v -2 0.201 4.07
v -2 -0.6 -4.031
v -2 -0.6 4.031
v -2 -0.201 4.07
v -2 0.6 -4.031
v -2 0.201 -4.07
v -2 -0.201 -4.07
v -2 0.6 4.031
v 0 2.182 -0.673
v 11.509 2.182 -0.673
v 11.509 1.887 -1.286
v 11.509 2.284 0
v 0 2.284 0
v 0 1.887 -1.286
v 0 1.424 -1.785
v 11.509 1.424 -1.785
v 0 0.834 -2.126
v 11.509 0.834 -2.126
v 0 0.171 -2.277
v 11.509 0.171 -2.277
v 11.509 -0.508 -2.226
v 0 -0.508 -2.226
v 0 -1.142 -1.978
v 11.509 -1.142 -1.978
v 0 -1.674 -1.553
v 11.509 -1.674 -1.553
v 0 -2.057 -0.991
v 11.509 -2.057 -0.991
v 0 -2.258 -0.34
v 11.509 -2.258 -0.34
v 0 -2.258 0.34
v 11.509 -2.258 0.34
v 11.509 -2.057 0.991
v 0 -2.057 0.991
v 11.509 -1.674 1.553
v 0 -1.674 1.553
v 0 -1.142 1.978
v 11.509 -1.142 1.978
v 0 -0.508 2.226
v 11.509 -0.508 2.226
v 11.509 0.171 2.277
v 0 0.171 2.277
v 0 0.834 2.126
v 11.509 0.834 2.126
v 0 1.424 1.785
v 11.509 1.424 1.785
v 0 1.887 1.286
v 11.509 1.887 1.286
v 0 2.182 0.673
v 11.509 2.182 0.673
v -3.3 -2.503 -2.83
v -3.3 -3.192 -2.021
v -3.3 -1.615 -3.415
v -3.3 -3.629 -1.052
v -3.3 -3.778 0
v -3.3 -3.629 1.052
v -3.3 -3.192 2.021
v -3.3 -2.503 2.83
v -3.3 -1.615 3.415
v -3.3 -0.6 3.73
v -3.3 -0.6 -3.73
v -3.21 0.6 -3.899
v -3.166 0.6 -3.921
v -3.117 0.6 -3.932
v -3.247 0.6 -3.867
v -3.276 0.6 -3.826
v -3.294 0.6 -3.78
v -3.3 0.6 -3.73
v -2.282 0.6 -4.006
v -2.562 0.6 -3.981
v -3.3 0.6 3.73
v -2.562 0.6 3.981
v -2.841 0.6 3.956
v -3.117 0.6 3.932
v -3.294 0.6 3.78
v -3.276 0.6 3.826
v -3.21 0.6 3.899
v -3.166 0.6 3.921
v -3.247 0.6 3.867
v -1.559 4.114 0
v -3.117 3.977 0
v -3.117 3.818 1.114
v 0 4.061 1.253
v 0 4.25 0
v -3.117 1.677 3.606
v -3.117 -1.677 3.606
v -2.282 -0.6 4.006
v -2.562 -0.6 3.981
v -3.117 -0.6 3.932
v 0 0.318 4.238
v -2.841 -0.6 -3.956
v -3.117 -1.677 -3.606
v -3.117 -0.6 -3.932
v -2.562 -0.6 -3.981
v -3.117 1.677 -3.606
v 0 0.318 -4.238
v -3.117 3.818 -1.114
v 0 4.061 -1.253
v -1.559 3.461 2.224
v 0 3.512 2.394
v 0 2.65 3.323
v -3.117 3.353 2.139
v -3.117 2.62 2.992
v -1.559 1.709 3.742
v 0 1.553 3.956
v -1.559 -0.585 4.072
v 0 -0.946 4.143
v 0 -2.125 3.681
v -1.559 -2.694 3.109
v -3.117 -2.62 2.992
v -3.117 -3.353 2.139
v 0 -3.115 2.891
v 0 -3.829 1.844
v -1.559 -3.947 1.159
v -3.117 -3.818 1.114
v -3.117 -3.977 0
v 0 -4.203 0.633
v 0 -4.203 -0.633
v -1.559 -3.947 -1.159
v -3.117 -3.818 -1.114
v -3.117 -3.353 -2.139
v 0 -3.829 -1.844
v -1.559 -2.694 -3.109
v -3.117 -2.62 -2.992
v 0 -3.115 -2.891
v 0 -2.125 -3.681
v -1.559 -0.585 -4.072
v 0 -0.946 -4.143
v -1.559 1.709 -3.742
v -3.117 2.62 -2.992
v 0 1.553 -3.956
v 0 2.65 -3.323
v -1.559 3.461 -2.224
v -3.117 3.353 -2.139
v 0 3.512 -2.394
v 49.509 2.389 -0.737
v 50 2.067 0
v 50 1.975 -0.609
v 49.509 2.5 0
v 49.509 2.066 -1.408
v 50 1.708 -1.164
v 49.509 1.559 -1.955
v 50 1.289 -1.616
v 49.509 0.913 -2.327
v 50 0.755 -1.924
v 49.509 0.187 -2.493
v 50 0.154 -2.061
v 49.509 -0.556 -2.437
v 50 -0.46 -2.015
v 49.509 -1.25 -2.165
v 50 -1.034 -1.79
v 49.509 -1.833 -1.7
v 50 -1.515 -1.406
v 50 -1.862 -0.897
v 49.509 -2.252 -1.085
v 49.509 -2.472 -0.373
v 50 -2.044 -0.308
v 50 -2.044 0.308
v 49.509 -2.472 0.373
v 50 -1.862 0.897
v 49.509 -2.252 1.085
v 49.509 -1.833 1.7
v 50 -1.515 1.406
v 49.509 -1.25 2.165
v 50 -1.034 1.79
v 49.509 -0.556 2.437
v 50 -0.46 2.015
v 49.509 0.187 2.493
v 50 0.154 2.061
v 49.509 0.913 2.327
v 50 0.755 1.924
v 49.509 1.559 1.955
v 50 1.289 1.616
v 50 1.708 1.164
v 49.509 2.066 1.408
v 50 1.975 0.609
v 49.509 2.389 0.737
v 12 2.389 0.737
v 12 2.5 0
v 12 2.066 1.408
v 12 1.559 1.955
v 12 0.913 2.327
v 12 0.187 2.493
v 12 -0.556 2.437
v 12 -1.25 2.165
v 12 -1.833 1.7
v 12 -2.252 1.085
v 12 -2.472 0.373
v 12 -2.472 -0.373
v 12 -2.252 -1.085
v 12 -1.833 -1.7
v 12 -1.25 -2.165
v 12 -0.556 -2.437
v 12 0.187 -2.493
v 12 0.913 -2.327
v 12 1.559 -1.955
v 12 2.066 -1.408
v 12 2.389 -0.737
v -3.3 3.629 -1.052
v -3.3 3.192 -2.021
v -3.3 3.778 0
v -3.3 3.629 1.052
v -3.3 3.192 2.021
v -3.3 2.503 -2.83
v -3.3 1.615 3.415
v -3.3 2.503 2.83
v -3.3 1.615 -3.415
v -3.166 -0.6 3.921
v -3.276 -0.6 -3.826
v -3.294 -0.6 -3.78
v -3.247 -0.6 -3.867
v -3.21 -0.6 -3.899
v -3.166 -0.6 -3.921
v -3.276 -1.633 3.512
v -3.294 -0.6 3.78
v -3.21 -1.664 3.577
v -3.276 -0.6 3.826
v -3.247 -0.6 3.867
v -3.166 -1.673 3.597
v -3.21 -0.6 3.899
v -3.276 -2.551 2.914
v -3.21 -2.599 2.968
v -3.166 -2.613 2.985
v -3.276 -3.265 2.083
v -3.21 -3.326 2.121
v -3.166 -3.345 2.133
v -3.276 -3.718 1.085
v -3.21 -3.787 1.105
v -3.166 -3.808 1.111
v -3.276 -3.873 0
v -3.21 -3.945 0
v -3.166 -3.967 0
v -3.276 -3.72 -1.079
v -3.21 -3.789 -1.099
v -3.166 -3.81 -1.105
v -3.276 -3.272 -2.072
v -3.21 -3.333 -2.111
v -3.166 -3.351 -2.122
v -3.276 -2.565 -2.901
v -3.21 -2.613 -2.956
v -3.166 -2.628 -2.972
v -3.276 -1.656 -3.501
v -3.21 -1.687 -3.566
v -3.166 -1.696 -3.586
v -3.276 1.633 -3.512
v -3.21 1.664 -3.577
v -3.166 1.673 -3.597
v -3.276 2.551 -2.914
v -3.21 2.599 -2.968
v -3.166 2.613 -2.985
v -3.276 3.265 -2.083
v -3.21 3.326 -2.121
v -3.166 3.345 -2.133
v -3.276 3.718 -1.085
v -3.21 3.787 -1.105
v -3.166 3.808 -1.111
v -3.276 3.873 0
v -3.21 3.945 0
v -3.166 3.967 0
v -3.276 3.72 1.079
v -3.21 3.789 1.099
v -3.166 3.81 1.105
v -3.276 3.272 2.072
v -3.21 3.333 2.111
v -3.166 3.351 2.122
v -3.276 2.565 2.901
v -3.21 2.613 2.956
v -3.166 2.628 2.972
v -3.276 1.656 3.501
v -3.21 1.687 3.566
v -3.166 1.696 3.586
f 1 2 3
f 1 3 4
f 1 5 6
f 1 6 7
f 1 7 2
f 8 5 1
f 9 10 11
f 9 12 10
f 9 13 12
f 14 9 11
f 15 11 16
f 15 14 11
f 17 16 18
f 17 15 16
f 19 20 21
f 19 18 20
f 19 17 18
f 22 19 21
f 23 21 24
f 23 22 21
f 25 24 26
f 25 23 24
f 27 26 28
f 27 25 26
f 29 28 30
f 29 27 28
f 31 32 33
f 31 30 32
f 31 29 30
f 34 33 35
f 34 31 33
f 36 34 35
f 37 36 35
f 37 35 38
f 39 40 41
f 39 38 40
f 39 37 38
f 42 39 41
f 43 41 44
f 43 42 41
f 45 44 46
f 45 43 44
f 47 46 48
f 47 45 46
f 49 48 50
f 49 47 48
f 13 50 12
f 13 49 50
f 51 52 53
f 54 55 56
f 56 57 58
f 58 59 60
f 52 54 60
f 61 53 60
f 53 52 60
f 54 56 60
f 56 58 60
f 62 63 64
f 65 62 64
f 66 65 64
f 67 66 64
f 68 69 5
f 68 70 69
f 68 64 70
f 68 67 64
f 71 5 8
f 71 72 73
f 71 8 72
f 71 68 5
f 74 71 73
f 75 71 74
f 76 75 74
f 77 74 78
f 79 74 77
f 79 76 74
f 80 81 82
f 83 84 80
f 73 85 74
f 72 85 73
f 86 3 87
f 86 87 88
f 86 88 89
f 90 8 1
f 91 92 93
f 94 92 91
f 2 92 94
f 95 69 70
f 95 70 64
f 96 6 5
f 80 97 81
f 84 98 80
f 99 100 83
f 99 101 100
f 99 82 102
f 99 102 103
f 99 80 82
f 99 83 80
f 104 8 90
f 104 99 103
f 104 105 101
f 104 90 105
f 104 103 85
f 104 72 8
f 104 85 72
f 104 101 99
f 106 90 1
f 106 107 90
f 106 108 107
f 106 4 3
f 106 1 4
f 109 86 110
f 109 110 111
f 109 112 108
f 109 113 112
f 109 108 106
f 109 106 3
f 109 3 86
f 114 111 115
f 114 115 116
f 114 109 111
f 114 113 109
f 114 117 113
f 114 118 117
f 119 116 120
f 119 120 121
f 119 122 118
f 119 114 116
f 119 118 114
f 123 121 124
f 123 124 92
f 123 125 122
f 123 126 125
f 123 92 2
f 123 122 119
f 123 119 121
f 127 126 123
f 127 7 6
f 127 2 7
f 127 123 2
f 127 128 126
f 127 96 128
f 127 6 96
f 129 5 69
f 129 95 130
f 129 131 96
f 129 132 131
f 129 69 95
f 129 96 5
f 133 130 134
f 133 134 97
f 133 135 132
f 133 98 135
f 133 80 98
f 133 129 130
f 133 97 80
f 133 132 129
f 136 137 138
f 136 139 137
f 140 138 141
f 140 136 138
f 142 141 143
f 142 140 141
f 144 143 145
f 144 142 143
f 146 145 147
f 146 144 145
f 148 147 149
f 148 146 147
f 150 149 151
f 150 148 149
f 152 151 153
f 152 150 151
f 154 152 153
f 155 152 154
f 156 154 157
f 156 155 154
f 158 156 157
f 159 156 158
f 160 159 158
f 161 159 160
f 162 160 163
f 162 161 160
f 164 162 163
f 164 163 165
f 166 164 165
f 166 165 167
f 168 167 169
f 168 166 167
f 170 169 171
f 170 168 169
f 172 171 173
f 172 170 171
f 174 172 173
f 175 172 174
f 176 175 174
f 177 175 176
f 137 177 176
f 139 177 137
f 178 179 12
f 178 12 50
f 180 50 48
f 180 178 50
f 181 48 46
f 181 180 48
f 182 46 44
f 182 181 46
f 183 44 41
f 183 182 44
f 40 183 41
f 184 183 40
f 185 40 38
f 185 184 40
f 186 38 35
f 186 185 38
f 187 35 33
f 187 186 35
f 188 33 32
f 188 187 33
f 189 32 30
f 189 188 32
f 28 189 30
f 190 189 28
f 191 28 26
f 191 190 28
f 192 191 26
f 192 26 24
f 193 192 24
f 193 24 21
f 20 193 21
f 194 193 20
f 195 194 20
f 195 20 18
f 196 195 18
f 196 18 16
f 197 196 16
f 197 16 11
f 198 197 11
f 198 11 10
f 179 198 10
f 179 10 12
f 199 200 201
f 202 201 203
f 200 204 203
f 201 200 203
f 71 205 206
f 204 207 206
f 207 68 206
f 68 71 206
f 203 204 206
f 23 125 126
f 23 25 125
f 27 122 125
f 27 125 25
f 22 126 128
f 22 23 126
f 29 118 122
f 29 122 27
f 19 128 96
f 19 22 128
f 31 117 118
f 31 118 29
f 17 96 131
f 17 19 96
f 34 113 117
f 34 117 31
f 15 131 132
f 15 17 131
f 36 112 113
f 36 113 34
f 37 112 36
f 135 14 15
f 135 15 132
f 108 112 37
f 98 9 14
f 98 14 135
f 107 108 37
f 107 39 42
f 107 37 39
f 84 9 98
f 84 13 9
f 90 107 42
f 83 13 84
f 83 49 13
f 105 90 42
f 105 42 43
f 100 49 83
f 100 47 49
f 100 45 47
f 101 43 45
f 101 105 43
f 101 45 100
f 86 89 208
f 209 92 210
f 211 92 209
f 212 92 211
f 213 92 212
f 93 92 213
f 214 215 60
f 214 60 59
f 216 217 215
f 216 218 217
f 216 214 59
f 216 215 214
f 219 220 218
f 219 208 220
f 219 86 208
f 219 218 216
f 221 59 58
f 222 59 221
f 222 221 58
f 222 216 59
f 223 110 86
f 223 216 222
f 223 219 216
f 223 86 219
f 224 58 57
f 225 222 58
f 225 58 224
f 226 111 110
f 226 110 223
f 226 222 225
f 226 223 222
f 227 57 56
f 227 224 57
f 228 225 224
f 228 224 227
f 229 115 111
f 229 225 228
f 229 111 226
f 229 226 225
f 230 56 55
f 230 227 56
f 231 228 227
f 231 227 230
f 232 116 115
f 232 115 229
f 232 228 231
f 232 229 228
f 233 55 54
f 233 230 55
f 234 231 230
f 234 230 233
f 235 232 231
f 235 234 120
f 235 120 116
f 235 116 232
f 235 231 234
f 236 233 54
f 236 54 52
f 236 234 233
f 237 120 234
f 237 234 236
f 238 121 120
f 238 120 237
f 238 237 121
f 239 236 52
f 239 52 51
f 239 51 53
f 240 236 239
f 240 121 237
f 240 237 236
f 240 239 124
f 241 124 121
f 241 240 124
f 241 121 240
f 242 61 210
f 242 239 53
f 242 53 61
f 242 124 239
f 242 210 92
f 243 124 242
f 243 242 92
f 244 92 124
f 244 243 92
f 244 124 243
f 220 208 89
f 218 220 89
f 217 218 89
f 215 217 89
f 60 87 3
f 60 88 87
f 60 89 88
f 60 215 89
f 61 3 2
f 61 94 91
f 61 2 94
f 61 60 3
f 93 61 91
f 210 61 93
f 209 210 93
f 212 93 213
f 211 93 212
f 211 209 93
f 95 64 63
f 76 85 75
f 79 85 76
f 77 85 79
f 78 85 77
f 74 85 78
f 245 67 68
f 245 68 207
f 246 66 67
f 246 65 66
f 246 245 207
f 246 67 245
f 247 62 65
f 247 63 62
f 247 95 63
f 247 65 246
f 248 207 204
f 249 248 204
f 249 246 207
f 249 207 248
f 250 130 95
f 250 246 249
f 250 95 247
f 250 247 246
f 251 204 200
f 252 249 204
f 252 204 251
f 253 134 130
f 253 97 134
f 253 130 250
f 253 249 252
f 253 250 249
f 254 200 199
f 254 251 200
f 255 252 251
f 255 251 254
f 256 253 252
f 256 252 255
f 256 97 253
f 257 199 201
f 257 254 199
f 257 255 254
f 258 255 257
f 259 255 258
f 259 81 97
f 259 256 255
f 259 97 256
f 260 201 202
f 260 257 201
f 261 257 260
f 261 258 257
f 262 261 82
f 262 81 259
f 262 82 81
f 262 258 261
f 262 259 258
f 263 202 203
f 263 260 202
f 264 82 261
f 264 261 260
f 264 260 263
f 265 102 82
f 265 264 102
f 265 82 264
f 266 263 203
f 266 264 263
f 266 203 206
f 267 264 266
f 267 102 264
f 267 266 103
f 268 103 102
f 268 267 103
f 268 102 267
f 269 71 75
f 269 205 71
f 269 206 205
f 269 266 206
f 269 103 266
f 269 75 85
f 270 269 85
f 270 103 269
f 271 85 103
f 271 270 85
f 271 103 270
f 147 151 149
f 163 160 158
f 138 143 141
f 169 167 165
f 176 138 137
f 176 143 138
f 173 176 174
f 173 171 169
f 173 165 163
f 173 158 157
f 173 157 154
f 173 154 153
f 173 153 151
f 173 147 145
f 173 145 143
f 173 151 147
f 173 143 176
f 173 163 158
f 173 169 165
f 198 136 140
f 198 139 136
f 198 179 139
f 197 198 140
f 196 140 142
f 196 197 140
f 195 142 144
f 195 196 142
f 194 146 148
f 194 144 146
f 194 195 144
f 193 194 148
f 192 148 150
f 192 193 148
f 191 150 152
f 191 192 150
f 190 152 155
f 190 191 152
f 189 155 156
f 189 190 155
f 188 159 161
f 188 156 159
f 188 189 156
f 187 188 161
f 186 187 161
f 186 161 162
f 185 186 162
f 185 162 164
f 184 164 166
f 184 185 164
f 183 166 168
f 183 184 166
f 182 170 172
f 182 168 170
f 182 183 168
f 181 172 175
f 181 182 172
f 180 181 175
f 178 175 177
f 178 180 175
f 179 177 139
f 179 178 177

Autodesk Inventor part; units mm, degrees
ref_plane "YZ Plane" through (0, 0, 0) normal (1, 0, 0) x (0, 1, 0)
ref_plane "XZ Plane" through (0, 0, 0) normal (0, 1, 0) x (-1, 0, 0)
sketch "Sketch1" plane through (0, 0, 0) normal (0, 0, 1) x (1, 0, 0)
  line L0 (-3.3, 0) -> (50, 0)
  line L1 (50, 0) -> (50, 2.5)
  line L2 (50, 2.5) -> (12, 2.5)
  line L3 (12, 2.5) -> (11.5091, 2.2835)
  line L4 (11.5091, 2.2835) -> (0, 2.2835)
  line L5 (0, 2.2835) -> (0, 4.25)
  line L6 (-13.96, 0) -> (60.66, 0) projected
  line L7 (0, -0.85) -> (0, 5.1) projected
  line L8 (-3.3, 0) -> (-3.3, 3.9613)
  line L9 (0, 4.25) -> (-3.3, 3.9613)
  line L10 (12, 2.5) -> (0, 2.5) construction
  dimension "d0" = 50
  dimension "d1" = 38
  dimension "d2" = 0.4909
  dimension "d3" = 3.3
  dimension "d4" = 5
  dimension "d5" = 4.567
  dimension "d9" = 8.5
  dimension "d10" = 5
revolve "Body" add sketch "Sketch1" angle 360 about axis through (-3.3, 0, 0) along (1, 0, 0)
sketch "Sketch2" plane through (-3.3, 0, 0) normal (-1, 0, 0) x (0, 0, 1)
  circle A0 centre (0, 0) radius 4.25 projected
  line L0 (0, 0) -> (0, 3.9613) projected
  line L1 (-4.25, 0.6) -> (4.25, 0.6)
  line L2 (4.25, 0.6) -> (4.25, -0.6)
  line L3 (4.25, -0.6) -> (-4.25, -0.6)
  line L4 (-4.25, -0.6) -> (-4.25, 0.6)
  line L5 (-4.25, 0) -> (4.25, 0) construction
  line L6 (0, 0.6) -> (0, -0.6) construction
  point P0 (0, 0)
  dimension "d11" = 1.2
  dimension "d12" = 8.5
fillet "Fillet1" radius 0.2 1 edges at (-3.3, -3.9613, 0)
extrude "Slot" cut sketch "Sketch2" against normal blind 1.3 contours A0 L3 L1 | L2 L3 A0 | A0 L1 L2 | A0 L4 L1 | L3 L4 A0
thread "Thread" size "M5x0.8" class "6g" standard "ISO Metric profile" length 38
chamfer "Chamfer1" distance 0.433 distance2 0.4909 1 edges at (50, -2.5, 0) measured on face at (50, -0.4809, -0.0271)
ref_plane "Work Plane1" through (30.1625, 0, 0) normal (0, 0, -1) x (1, 0, 0)
equation "\"d11\" = SBR"
equation "\"d12\" = KOD"
equation "\"d14\" = RR"
equation "\"d19\" = STI"
equation "\"d15\" = GEL"
equation "\"d17\" = -0.5 * SPD + 0.5 * GD"
equation "\"d0\" = NLG"
equation "\"d1\" = GEL"
equation "\"d3\" = KOH"
equation "\"d4\" = GD"
equation "\"d5\" = BDM"
equation "\"d9\" = KOD"
equation "\"d10\" = KEWI"
equation "\"GD\" = 5"
equation "\"NLG\" = 50"
equation "\"GEL\" = 38"
equation "\"KOD\" = 8.5"
equation "\"KOH\" = 3.3"
equation "\"GAL\" = 0.61345 * PTC"
equation "\"SPD\" = 4.13397"
equation "\"BDM\" = 4.56699"
equation "\"GUL\" = 0.61345 * PTC"
equation "\"RR\" = 0.2"
equation "\"SBR\" = 1.2"
equation "\"STI\" = 1.3"
equation "\"KEWI\" = 5deg"
equation "\"PTC\" = 0.8"
equation "\"THREADDIA\" = 5"
equation "\"TOA\" = 30deg"
equation "\"NND\" = 5"
equation "\"GD1\" = THREADDIA - 1.2269 * PTC"
properties part number "DIN 84 - M5 x 50" material "Steel, Mild"
